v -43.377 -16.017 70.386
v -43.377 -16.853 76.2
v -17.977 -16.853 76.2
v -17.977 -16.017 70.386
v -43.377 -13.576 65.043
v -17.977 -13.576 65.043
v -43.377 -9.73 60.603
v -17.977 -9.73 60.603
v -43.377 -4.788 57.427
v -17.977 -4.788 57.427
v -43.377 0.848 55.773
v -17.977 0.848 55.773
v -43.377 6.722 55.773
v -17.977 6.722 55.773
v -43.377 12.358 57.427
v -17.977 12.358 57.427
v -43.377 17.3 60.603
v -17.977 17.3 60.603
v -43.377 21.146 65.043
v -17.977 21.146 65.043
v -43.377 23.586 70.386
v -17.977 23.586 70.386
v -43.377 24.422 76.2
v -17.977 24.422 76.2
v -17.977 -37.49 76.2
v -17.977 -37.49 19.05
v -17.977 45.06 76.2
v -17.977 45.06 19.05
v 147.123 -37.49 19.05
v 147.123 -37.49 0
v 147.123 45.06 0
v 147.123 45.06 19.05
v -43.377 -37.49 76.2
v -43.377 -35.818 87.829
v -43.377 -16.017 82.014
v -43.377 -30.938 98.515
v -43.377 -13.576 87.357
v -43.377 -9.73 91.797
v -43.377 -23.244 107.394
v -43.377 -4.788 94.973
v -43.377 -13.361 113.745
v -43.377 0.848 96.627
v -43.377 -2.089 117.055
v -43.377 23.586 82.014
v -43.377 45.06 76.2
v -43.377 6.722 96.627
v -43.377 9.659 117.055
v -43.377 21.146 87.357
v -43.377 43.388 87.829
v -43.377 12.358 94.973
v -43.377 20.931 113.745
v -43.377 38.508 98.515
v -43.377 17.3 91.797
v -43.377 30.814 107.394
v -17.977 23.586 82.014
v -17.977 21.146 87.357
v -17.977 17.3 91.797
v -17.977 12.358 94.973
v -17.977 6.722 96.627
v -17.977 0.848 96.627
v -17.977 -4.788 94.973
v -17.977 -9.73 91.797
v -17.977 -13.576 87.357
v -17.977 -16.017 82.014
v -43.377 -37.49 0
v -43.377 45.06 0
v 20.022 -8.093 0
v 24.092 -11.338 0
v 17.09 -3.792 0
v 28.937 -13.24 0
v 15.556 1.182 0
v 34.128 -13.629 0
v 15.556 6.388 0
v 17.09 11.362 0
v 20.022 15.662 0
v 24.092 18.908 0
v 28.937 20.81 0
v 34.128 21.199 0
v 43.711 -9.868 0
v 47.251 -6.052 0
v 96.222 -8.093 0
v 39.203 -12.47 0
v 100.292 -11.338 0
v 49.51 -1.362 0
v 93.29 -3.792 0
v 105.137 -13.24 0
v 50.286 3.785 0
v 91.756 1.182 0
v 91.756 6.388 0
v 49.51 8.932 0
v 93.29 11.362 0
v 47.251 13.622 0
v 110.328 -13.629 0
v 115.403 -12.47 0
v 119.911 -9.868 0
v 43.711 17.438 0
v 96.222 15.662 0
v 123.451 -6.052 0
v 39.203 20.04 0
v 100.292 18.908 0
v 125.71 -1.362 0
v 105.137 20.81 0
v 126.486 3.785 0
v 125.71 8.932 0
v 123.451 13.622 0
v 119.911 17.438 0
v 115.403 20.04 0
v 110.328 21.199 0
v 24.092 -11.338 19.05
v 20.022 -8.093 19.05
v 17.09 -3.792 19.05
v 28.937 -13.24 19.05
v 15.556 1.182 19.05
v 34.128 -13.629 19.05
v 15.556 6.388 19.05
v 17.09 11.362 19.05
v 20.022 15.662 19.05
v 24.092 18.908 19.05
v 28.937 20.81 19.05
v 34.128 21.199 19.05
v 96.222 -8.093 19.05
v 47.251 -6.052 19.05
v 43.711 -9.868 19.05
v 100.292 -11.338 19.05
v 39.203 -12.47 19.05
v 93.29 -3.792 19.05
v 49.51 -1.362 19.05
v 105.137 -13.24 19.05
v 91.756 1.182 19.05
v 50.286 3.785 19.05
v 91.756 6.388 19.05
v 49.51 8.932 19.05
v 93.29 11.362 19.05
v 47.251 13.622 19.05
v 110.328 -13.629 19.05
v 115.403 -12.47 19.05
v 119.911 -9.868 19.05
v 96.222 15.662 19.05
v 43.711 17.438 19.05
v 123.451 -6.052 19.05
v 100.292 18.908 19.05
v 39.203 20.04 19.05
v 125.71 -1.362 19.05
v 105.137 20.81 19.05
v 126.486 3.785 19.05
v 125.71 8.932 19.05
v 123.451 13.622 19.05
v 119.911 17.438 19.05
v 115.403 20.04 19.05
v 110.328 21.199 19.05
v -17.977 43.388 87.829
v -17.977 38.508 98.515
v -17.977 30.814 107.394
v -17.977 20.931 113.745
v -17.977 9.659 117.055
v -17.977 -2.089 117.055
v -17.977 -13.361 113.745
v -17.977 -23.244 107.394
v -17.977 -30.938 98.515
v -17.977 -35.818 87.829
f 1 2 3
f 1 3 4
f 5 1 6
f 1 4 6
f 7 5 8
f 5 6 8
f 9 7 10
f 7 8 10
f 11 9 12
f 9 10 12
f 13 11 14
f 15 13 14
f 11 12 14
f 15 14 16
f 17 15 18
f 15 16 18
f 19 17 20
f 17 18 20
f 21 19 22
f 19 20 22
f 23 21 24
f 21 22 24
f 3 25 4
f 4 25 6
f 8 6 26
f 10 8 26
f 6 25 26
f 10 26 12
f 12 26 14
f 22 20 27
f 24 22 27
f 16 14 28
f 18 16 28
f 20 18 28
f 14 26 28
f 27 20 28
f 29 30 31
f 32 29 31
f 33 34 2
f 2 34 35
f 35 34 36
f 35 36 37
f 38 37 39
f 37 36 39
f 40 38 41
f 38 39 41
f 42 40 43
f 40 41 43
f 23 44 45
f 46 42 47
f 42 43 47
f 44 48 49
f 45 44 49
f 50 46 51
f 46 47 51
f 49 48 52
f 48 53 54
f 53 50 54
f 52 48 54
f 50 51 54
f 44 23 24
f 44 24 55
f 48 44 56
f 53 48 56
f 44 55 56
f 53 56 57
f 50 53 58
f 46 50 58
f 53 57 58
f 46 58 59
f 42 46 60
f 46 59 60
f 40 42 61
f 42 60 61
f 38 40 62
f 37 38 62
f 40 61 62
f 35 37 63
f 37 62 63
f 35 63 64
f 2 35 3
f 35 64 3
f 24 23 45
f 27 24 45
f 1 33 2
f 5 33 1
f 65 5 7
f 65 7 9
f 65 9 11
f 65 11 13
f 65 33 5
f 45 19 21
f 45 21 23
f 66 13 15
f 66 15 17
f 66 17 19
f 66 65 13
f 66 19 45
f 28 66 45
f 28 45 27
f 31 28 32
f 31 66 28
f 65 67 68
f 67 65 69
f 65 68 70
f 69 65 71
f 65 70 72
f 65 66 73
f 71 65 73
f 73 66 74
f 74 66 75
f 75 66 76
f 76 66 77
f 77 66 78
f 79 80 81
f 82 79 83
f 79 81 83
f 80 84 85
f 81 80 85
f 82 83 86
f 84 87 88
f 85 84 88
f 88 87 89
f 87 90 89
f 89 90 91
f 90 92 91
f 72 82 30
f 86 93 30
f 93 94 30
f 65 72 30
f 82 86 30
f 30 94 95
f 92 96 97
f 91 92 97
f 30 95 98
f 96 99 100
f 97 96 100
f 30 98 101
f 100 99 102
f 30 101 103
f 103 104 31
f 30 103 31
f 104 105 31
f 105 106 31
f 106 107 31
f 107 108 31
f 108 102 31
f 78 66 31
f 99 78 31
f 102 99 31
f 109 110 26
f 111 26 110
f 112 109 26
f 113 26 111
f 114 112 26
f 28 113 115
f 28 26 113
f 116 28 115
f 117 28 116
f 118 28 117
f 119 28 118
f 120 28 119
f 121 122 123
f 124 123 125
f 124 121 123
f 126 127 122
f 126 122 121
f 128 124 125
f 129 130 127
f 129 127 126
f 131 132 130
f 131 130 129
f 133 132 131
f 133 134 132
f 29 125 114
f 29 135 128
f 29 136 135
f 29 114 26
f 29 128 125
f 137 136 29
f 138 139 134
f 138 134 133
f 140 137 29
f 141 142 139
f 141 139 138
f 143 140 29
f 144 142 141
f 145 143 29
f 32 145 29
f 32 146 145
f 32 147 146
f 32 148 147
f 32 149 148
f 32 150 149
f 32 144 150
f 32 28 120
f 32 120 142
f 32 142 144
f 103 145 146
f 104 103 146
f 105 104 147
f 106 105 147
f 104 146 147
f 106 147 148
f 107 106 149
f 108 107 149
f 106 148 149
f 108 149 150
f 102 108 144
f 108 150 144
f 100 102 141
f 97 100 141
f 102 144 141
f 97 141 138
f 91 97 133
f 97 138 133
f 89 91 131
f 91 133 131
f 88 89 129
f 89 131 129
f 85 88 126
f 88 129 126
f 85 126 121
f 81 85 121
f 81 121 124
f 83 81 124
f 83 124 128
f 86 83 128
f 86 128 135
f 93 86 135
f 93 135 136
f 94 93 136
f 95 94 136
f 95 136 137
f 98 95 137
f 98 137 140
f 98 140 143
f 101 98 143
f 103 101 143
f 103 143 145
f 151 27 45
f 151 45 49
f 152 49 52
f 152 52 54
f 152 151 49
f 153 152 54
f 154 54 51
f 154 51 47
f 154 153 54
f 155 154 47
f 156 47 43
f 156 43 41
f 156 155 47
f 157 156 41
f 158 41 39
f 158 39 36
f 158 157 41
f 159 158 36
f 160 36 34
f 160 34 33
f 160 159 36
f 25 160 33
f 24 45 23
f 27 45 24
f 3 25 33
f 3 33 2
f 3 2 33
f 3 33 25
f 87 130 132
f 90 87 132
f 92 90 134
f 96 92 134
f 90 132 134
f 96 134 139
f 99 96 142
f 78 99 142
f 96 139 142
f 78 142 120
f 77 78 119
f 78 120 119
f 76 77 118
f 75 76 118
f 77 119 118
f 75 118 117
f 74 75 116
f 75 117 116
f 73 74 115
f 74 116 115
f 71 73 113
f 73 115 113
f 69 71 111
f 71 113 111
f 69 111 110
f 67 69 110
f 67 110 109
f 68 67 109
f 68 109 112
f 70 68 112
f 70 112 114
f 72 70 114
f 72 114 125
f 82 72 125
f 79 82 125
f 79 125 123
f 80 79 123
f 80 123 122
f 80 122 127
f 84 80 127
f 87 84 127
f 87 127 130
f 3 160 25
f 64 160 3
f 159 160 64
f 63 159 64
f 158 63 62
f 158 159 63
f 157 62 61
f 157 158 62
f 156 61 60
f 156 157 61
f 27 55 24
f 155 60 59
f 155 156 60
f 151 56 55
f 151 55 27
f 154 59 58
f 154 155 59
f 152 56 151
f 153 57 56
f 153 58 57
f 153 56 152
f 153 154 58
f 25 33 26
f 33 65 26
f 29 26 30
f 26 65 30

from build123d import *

# Parameters (mm, degrees)
F0_W      = 190.5
F0_H      = 82.55
F1_DEPTH  = 19.05
F2_W      = 25.4
F2_H      = 82.55
F3_DEPTH  = 57.15
F5_DEPTH  = 25.4
F7_DEPTH  = 25.4
F9_DEPTH  = 25.4
F10_R     = 17.4625
F11_DEPTH = 25.4
F12_R     = 17.4625
F13_DEPTH = 25.4


with BuildPart() as f1:
    # F0 (on Top) → F1 (new body)
    with BuildSketch(Plane.XY):
        with Locations((51.8731928766, 3.7849264085)):
            Rectangle(F0_W, F0_H)
    extrude(amount=F1_DEPTH)

    # F2 (on face) → F3 (join)
    with BuildSketch(Plane.XY.offset(19.05)):
        with Locations((-30.6768071234, 3.7849264085)):
            Rectangle(F2_W, F2_H)
    extrude(amount=F3_DEPTH)


with BuildPart() as f5:
    # F4 (on face) → F5 (new body)
    with BuildSketch(Plane.YZ.offset(-17.9768071234)):
        with BuildLine():
            Line((-37.4900735915, 76.2), (45.0599264085, 76.2))
            ThreePointArc((45.0599264085, 76.2), (3.7849264085, 117.475), (-37.4900735915, 76.2))
        make_face()
    extrude(amount=-F5_DEPTH)


with BuildPart() as f7_tool:
    # F6 (on face) → F7 (new body)
    with BuildSketch(Plane.YZ.offset(-17.9768071234)):
        with BuildLine():
            Line((-16.8525735915, 76.2), (24.4224264085, 76.2))
            ThreePointArc((24.4224264085, 76.2), (3.7849264085, 96.8375), (-16.8525735915, 76.2))
        make_face()
        with BuildLine():
            ThreePointArc((-16.8525735915, 76.2), (3.7849264085, 55.5625), (24.4224264085, 76.2))
            Line((24.4224264085, 76.2), (-16.8525735915, 76.2))
        make_face()
    extrude(amount=-F7_DEPTH)


with BuildPart() as f1_1:
    add(f1.part)

    # F7: cut by f7_tool
    add(f7_tool.part, mode=Mode.SUBTRACT)

    # F8 (on face) → F9 (cut)
    with BuildSketch(Plane.YZ.offset(-17.9768071234)):
        with BuildLine():
            ThreePointArc((-16.8525735915, 76.2), (3.7849264085, 55.5625), (24.4224264085, 76.2))
            ThreePointArc((24.4224264085, 76.2), (3.7849264085, 96.8375), (-16.8525735915, 76.2))
        make_face()
    extrude(amount=-F9_DEPTH, mode=Mode.SUBTRACT)

    # F10 (on face) → F11 (cut)
    with BuildSketch(Plane.XY.offset(19.05)):
        with Locations((109.0231928766, 3.7849264085)):
            Circle(F10_R)
    extrude(amount=-F11_DEPTH, mode=Mode.SUBTRACT)

    # F12 (on face) → F13 (cut)
    with BuildSketch(Plane.XY.offset(19.05)):
        with Locations((32.8231928766, 3.7849264085)):
            Circle(F12_R)
    extrude(amount=-F13_DEPTH, mode=Mode.SUBTRACT)


with BuildPart() as f5_1:
    add(f5.part)

    # F7: cut by f7_tool
    add(f7_tool.part, mode=Mode.SUBTRACT)


solid = Compound([f1_1.part, f5_1.part])
